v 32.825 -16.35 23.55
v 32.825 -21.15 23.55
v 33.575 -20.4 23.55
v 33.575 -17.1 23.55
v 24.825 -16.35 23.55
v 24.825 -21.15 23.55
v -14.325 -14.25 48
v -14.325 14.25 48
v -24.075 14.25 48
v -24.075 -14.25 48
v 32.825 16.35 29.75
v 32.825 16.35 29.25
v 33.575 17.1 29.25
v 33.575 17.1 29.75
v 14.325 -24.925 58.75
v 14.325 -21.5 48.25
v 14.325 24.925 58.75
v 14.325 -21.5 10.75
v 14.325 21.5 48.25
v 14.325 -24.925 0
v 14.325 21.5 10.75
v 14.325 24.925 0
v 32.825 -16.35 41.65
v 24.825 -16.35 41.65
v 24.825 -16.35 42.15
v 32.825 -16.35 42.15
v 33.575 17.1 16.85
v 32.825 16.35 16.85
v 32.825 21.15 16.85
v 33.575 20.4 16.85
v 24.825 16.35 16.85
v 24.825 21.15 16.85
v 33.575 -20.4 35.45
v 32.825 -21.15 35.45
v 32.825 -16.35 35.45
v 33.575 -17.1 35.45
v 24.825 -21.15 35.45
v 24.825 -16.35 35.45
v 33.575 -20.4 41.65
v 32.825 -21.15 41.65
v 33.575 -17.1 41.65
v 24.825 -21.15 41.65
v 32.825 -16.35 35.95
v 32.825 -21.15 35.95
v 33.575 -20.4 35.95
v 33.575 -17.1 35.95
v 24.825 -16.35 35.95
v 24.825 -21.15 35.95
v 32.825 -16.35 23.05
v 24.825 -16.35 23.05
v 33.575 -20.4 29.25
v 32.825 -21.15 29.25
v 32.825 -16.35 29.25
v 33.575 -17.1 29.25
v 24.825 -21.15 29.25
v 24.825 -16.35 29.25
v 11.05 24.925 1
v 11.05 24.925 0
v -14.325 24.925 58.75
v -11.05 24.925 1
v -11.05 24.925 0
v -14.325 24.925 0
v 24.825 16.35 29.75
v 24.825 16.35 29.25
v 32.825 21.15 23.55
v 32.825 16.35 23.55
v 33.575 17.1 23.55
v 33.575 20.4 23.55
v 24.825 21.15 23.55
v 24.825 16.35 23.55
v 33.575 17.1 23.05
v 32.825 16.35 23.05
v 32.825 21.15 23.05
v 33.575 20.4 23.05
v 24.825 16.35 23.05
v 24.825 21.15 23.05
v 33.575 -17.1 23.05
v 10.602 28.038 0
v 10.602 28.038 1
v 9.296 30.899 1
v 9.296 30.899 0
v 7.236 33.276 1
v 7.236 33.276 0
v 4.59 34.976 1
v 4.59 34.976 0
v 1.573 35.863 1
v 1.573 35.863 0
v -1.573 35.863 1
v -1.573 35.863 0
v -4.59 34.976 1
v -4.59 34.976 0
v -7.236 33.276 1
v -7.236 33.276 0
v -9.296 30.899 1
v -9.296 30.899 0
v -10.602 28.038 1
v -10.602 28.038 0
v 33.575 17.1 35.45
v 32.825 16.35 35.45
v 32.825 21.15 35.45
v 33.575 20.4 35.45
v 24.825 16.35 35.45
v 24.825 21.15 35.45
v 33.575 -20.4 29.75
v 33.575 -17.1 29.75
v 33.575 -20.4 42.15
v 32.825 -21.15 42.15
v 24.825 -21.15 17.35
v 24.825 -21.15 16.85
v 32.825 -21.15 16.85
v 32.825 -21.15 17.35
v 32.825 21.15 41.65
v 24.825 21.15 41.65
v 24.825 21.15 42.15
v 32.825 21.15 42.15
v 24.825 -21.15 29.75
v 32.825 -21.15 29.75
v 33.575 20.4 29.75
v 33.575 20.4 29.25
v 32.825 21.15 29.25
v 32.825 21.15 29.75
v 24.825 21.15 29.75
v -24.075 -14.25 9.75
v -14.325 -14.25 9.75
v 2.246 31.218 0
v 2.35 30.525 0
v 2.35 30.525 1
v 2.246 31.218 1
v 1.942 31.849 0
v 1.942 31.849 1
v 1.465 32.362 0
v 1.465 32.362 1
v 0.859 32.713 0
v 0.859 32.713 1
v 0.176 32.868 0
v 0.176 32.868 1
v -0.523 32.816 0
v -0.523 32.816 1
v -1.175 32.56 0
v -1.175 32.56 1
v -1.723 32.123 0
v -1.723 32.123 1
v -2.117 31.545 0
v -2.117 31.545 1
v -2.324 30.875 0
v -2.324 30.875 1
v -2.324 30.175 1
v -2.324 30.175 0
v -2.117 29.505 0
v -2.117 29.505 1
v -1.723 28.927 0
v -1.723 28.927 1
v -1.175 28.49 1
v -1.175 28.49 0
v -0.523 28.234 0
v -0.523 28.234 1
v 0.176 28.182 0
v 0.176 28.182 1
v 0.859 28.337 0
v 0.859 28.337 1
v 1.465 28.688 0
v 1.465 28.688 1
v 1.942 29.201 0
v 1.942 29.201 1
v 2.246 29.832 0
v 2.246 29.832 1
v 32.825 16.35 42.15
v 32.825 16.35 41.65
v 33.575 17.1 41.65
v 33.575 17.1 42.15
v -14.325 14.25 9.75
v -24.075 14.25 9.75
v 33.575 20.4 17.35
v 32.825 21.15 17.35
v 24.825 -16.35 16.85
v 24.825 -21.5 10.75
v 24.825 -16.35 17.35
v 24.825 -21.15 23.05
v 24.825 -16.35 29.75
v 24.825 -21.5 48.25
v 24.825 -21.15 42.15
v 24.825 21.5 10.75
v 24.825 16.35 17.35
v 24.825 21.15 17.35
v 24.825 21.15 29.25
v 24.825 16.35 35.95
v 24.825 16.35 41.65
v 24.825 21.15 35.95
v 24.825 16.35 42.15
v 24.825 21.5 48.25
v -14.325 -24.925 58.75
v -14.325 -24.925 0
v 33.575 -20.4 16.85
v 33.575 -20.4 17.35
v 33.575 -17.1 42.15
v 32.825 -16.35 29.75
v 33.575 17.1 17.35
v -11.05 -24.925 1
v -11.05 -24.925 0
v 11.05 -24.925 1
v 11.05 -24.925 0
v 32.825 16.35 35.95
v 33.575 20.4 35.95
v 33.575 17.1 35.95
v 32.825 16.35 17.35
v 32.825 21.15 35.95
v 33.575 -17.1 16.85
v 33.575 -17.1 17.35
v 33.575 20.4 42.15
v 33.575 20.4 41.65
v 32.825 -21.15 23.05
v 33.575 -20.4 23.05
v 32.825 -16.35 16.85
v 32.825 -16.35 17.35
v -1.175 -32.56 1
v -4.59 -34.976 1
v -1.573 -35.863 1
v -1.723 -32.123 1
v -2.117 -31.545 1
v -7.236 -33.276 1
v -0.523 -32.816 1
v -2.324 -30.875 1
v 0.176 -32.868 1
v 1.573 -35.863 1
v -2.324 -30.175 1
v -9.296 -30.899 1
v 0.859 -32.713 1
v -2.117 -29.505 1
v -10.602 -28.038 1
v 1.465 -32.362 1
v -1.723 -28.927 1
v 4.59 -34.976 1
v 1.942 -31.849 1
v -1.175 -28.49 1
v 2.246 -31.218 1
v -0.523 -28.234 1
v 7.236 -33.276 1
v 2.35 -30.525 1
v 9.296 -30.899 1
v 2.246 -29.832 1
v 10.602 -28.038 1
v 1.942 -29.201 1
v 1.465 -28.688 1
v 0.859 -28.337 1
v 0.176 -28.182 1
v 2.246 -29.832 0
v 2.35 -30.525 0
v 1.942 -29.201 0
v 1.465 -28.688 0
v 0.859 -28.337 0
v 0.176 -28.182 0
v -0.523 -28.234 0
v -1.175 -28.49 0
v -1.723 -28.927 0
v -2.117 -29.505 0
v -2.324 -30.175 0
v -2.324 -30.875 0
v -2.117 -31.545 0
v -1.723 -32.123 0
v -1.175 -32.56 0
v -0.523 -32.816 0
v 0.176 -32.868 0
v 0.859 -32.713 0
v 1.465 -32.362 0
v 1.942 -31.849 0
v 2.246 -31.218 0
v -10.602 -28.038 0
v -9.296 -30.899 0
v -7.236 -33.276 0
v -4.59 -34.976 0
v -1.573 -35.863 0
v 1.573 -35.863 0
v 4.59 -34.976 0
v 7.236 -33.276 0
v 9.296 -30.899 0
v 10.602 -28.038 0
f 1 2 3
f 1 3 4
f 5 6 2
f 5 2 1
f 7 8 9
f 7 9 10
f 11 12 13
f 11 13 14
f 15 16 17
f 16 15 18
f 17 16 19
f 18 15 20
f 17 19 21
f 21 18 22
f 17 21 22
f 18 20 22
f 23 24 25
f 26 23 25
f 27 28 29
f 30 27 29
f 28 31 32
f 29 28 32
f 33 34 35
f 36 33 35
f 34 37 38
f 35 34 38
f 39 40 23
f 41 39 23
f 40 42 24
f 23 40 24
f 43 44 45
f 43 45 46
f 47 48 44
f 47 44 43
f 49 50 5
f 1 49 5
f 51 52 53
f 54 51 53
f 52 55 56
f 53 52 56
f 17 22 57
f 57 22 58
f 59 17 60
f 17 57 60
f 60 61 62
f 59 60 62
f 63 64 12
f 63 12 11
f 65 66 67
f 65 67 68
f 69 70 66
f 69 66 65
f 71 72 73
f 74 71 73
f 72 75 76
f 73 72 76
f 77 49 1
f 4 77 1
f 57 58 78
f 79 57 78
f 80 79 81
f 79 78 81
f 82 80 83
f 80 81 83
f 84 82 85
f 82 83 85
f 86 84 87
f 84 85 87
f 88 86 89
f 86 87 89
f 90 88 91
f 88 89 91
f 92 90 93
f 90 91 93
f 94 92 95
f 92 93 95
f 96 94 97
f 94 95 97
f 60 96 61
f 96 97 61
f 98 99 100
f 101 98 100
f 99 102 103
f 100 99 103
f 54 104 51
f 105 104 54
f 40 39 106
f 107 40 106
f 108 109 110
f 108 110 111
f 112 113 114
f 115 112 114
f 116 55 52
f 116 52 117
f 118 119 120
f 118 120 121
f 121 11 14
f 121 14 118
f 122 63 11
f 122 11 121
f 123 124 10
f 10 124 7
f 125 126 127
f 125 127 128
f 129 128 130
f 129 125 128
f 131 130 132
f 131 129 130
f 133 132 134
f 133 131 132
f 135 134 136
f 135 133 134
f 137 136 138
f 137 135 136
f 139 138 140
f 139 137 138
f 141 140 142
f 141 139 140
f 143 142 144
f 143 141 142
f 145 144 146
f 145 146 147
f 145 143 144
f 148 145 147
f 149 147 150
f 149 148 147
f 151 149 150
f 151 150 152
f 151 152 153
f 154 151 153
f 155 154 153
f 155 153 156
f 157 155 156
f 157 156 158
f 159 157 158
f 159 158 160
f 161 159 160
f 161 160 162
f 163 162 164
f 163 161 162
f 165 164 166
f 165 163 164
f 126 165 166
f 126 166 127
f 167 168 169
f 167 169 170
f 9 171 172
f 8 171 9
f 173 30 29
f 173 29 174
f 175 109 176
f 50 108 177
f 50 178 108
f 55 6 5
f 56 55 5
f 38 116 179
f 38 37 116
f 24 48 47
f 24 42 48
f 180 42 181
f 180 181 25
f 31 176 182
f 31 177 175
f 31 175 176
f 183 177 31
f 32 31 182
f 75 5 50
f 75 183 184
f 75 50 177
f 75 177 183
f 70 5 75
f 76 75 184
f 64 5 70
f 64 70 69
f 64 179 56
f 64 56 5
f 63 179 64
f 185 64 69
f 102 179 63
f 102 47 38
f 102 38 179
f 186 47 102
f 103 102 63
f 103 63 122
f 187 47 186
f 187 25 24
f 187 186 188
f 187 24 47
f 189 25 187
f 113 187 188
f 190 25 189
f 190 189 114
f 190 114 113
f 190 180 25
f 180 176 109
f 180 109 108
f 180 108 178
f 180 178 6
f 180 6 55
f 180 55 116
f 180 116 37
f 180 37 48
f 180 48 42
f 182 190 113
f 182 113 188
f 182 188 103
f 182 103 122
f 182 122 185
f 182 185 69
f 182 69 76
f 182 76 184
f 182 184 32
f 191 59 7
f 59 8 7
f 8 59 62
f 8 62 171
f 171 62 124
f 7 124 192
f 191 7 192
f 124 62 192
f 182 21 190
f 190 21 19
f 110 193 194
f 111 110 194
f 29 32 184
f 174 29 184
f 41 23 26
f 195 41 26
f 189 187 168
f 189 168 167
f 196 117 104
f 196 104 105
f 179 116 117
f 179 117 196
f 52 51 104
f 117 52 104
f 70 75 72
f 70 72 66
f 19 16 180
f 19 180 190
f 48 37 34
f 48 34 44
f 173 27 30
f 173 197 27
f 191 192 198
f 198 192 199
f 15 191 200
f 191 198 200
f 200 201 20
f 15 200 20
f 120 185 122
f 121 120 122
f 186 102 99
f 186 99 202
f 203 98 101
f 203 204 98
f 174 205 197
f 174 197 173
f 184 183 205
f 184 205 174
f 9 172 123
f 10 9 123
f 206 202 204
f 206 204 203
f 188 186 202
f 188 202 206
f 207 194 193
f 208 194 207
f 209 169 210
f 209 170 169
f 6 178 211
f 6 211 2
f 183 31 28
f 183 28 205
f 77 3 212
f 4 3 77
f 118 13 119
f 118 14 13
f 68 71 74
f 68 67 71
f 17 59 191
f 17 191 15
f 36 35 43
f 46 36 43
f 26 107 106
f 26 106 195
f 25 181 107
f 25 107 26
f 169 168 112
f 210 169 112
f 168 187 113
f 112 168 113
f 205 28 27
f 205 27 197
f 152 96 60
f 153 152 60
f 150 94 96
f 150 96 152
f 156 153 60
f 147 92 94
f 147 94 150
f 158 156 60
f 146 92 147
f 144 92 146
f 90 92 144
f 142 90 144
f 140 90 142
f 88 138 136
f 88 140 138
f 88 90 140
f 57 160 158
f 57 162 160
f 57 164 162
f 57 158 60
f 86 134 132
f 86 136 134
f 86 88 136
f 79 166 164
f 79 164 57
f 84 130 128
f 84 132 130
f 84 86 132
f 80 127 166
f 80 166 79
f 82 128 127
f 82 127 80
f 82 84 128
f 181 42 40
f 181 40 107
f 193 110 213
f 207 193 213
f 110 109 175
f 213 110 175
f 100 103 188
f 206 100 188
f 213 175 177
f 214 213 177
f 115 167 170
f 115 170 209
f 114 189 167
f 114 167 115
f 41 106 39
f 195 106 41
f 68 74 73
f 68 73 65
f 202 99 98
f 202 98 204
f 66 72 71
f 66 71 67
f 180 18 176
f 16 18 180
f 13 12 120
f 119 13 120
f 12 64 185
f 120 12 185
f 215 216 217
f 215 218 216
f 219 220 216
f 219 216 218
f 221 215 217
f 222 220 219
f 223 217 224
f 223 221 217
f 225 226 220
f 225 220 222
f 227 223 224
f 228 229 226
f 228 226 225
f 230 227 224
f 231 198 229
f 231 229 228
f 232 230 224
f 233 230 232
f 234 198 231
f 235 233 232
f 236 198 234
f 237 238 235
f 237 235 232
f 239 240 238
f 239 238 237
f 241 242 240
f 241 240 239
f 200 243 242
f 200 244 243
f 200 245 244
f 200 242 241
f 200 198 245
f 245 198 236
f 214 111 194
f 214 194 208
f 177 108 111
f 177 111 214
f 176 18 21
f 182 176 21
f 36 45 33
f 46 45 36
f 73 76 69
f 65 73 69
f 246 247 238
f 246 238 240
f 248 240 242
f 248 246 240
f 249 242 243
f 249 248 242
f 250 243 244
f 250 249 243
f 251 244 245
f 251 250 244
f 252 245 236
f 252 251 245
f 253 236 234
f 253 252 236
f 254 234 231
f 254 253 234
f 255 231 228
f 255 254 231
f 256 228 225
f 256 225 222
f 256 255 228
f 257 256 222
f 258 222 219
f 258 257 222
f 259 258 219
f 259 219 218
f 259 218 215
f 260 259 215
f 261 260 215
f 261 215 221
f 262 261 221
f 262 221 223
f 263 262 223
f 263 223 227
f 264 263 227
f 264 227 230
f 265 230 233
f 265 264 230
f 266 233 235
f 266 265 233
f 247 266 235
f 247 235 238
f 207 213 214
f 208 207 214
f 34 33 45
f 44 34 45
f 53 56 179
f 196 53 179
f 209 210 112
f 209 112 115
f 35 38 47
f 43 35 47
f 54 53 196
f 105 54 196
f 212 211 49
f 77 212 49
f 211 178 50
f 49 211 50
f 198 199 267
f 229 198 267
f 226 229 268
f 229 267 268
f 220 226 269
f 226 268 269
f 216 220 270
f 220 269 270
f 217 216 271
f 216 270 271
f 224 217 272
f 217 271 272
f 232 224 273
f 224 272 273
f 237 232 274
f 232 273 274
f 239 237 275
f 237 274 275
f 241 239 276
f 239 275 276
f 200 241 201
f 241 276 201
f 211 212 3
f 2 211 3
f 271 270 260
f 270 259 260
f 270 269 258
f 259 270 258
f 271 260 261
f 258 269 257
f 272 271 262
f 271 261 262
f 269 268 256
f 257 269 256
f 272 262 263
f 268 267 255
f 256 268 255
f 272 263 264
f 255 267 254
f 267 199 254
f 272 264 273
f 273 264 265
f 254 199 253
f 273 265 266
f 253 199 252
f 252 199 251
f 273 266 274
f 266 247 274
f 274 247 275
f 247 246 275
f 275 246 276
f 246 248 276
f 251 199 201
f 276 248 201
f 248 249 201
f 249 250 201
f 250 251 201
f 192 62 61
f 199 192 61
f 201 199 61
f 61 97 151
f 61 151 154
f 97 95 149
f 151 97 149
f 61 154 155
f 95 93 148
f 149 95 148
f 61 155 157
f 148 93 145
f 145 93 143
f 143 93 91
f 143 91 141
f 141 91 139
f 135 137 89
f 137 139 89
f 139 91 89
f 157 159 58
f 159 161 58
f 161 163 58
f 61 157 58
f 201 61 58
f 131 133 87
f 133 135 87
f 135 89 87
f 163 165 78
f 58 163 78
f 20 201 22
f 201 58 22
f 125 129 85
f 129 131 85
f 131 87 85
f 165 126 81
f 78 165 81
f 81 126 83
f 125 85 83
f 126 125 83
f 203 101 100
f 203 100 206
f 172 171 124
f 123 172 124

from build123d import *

# Parameters (mm, degrees)
F1_DEPTH = 58.75
F0_R     = 2.35
F2_DEPTH = 1
F3_W     = 28.5
F3_H     = 38.25
F4_DEPTH = 9.75
F5_W     = 43
F5_H     = 37.5
F6_DEPTH = 10.5
F7_W     = 4.8
F7_H     = 0.5
F8_DEPTH = 8.75
F9_SIZE  = 0.75


with BuildPart() as f1:
    # F0 (on Top) → F1 (new body)
    with BuildSketch(Plane.XY):
        Polygon((11.05, -24.925), (14.325, -24.925), (14.325, 24.925), (11.05, 24.925), (-11.05, 24.925), (-14.325, 24.925), (-14.325, -24.925), (-11.05, -24.925), align=None)
    extrude(amount=F1_DEPTH)

    # F0 (on Top) → F2 (join)
    with BuildSketch(Plane.XY):
        with BuildLine():
            ThreePointArc((-11.05, -24.925), (0, -35.975), (11.05, -24.925))
            Line((11.05, -24.925), (-11.05, -24.925))
        make_face()
        with Locations((0, -30.525)):
            Circle(F0_R, mode=Mode.SUBTRACT)
        with BuildLine():
            Line((-11.05, 24.925), (11.05, 24.925))
            ThreePointArc((11.05, 24.925), (0, 35.975), (-11.05, 24.925))
        make_face()
        with Locations((0, 30.525)):
            Circle(F0_R, mode=Mode.SUBTRACT)
    extrude(amount=F2_DEPTH)

    # F3 (on face) → F4 (join)
    with BuildSketch(Plane(origin=(-14.325, 0, 0), x_dir=(0, -1, 0), z_dir=(-1, 0, 0))):
        with Locations((0, 28.875)):
            Rectangle(F3_W, F3_H)
    extrude(amount=F4_DEPTH)

    # F5 (on face) → F6 (join)
    with BuildSketch(Plane.YZ.offset(14.325)):
        with Locations((0, 29.5)):
            Rectangle(F5_W, F5_H)
    extrude(amount=F6_DEPTH)

    # F7 (on face) → F8 (join)
    with BuildSketch(Plane.YZ.offset(24.825)):
        with Locations((-18.75, 29.5)):
            Rectangle(F7_W, F7_H)
        with Locations((-18.75, 35.7)):
            Rectangle(F7_W, F7_H)
        with Locations((-18.75, 41.9)):
            Rectangle(F7_W, F7_H)
        with Locations((-18.75, 17.1)):
            Rectangle(F7_W, F7_H)
        with Locations((-18.75, 23.3)):
            Rectangle(F7_W, F7_H)
        with Locations((18.75, 29.5)):
            Rectangle(F7_W, F7_H)
        with Locations((18.75, 35.7)):
            Rectangle(F7_W, F7_H)
        with Locations((18.75, 17.1)):
            Rectangle(F7_W, F7_H)
        with Locations((18.75, 23.3)):
            Rectangle(F7_W, F7_H)
        with Locations((18.75, 41.9)):
            Rectangle(F7_W, F7_H)
    extrude(amount=F8_DEPTH)

    # F9
    f9_edges = [f1.edges().sort_by_distance(p)[0] for p in [
        (33.575, -21.15, 41.9),
        (33.575, -16.35, 41.9),
        (33.575, -21.15, 35.7),
        (33.575, -16.35, 35.7),
        (33.575, -21.15, 29.5),
        (33.575, -16.35, 29.5),
        (33.575, -21.15, 17.1),
        (33.575, -16.35, 17.1),
        (33.575, 16.35, 17.1),
        (33.575, 21.15, 17.1),
        (33.575, 16.35, 29.5),
        (33.575, 21.15, 29.5),
        (33.575, 16.35, 35.7),
        (33.575, 21.15, 35.7),
        (33.575, 16.35, 41.9),
        (33.575, 21.15, 41.9),
        (33.575, -16.35, 23.3),
        (33.575, -21.15, 23.3),
        (33.575, 16.35, 23.3),
        (33.575, 21.15, 23.3),
    ]]
    chamfer(f9_edges, length=F9_SIZE)


solid = f1.part
